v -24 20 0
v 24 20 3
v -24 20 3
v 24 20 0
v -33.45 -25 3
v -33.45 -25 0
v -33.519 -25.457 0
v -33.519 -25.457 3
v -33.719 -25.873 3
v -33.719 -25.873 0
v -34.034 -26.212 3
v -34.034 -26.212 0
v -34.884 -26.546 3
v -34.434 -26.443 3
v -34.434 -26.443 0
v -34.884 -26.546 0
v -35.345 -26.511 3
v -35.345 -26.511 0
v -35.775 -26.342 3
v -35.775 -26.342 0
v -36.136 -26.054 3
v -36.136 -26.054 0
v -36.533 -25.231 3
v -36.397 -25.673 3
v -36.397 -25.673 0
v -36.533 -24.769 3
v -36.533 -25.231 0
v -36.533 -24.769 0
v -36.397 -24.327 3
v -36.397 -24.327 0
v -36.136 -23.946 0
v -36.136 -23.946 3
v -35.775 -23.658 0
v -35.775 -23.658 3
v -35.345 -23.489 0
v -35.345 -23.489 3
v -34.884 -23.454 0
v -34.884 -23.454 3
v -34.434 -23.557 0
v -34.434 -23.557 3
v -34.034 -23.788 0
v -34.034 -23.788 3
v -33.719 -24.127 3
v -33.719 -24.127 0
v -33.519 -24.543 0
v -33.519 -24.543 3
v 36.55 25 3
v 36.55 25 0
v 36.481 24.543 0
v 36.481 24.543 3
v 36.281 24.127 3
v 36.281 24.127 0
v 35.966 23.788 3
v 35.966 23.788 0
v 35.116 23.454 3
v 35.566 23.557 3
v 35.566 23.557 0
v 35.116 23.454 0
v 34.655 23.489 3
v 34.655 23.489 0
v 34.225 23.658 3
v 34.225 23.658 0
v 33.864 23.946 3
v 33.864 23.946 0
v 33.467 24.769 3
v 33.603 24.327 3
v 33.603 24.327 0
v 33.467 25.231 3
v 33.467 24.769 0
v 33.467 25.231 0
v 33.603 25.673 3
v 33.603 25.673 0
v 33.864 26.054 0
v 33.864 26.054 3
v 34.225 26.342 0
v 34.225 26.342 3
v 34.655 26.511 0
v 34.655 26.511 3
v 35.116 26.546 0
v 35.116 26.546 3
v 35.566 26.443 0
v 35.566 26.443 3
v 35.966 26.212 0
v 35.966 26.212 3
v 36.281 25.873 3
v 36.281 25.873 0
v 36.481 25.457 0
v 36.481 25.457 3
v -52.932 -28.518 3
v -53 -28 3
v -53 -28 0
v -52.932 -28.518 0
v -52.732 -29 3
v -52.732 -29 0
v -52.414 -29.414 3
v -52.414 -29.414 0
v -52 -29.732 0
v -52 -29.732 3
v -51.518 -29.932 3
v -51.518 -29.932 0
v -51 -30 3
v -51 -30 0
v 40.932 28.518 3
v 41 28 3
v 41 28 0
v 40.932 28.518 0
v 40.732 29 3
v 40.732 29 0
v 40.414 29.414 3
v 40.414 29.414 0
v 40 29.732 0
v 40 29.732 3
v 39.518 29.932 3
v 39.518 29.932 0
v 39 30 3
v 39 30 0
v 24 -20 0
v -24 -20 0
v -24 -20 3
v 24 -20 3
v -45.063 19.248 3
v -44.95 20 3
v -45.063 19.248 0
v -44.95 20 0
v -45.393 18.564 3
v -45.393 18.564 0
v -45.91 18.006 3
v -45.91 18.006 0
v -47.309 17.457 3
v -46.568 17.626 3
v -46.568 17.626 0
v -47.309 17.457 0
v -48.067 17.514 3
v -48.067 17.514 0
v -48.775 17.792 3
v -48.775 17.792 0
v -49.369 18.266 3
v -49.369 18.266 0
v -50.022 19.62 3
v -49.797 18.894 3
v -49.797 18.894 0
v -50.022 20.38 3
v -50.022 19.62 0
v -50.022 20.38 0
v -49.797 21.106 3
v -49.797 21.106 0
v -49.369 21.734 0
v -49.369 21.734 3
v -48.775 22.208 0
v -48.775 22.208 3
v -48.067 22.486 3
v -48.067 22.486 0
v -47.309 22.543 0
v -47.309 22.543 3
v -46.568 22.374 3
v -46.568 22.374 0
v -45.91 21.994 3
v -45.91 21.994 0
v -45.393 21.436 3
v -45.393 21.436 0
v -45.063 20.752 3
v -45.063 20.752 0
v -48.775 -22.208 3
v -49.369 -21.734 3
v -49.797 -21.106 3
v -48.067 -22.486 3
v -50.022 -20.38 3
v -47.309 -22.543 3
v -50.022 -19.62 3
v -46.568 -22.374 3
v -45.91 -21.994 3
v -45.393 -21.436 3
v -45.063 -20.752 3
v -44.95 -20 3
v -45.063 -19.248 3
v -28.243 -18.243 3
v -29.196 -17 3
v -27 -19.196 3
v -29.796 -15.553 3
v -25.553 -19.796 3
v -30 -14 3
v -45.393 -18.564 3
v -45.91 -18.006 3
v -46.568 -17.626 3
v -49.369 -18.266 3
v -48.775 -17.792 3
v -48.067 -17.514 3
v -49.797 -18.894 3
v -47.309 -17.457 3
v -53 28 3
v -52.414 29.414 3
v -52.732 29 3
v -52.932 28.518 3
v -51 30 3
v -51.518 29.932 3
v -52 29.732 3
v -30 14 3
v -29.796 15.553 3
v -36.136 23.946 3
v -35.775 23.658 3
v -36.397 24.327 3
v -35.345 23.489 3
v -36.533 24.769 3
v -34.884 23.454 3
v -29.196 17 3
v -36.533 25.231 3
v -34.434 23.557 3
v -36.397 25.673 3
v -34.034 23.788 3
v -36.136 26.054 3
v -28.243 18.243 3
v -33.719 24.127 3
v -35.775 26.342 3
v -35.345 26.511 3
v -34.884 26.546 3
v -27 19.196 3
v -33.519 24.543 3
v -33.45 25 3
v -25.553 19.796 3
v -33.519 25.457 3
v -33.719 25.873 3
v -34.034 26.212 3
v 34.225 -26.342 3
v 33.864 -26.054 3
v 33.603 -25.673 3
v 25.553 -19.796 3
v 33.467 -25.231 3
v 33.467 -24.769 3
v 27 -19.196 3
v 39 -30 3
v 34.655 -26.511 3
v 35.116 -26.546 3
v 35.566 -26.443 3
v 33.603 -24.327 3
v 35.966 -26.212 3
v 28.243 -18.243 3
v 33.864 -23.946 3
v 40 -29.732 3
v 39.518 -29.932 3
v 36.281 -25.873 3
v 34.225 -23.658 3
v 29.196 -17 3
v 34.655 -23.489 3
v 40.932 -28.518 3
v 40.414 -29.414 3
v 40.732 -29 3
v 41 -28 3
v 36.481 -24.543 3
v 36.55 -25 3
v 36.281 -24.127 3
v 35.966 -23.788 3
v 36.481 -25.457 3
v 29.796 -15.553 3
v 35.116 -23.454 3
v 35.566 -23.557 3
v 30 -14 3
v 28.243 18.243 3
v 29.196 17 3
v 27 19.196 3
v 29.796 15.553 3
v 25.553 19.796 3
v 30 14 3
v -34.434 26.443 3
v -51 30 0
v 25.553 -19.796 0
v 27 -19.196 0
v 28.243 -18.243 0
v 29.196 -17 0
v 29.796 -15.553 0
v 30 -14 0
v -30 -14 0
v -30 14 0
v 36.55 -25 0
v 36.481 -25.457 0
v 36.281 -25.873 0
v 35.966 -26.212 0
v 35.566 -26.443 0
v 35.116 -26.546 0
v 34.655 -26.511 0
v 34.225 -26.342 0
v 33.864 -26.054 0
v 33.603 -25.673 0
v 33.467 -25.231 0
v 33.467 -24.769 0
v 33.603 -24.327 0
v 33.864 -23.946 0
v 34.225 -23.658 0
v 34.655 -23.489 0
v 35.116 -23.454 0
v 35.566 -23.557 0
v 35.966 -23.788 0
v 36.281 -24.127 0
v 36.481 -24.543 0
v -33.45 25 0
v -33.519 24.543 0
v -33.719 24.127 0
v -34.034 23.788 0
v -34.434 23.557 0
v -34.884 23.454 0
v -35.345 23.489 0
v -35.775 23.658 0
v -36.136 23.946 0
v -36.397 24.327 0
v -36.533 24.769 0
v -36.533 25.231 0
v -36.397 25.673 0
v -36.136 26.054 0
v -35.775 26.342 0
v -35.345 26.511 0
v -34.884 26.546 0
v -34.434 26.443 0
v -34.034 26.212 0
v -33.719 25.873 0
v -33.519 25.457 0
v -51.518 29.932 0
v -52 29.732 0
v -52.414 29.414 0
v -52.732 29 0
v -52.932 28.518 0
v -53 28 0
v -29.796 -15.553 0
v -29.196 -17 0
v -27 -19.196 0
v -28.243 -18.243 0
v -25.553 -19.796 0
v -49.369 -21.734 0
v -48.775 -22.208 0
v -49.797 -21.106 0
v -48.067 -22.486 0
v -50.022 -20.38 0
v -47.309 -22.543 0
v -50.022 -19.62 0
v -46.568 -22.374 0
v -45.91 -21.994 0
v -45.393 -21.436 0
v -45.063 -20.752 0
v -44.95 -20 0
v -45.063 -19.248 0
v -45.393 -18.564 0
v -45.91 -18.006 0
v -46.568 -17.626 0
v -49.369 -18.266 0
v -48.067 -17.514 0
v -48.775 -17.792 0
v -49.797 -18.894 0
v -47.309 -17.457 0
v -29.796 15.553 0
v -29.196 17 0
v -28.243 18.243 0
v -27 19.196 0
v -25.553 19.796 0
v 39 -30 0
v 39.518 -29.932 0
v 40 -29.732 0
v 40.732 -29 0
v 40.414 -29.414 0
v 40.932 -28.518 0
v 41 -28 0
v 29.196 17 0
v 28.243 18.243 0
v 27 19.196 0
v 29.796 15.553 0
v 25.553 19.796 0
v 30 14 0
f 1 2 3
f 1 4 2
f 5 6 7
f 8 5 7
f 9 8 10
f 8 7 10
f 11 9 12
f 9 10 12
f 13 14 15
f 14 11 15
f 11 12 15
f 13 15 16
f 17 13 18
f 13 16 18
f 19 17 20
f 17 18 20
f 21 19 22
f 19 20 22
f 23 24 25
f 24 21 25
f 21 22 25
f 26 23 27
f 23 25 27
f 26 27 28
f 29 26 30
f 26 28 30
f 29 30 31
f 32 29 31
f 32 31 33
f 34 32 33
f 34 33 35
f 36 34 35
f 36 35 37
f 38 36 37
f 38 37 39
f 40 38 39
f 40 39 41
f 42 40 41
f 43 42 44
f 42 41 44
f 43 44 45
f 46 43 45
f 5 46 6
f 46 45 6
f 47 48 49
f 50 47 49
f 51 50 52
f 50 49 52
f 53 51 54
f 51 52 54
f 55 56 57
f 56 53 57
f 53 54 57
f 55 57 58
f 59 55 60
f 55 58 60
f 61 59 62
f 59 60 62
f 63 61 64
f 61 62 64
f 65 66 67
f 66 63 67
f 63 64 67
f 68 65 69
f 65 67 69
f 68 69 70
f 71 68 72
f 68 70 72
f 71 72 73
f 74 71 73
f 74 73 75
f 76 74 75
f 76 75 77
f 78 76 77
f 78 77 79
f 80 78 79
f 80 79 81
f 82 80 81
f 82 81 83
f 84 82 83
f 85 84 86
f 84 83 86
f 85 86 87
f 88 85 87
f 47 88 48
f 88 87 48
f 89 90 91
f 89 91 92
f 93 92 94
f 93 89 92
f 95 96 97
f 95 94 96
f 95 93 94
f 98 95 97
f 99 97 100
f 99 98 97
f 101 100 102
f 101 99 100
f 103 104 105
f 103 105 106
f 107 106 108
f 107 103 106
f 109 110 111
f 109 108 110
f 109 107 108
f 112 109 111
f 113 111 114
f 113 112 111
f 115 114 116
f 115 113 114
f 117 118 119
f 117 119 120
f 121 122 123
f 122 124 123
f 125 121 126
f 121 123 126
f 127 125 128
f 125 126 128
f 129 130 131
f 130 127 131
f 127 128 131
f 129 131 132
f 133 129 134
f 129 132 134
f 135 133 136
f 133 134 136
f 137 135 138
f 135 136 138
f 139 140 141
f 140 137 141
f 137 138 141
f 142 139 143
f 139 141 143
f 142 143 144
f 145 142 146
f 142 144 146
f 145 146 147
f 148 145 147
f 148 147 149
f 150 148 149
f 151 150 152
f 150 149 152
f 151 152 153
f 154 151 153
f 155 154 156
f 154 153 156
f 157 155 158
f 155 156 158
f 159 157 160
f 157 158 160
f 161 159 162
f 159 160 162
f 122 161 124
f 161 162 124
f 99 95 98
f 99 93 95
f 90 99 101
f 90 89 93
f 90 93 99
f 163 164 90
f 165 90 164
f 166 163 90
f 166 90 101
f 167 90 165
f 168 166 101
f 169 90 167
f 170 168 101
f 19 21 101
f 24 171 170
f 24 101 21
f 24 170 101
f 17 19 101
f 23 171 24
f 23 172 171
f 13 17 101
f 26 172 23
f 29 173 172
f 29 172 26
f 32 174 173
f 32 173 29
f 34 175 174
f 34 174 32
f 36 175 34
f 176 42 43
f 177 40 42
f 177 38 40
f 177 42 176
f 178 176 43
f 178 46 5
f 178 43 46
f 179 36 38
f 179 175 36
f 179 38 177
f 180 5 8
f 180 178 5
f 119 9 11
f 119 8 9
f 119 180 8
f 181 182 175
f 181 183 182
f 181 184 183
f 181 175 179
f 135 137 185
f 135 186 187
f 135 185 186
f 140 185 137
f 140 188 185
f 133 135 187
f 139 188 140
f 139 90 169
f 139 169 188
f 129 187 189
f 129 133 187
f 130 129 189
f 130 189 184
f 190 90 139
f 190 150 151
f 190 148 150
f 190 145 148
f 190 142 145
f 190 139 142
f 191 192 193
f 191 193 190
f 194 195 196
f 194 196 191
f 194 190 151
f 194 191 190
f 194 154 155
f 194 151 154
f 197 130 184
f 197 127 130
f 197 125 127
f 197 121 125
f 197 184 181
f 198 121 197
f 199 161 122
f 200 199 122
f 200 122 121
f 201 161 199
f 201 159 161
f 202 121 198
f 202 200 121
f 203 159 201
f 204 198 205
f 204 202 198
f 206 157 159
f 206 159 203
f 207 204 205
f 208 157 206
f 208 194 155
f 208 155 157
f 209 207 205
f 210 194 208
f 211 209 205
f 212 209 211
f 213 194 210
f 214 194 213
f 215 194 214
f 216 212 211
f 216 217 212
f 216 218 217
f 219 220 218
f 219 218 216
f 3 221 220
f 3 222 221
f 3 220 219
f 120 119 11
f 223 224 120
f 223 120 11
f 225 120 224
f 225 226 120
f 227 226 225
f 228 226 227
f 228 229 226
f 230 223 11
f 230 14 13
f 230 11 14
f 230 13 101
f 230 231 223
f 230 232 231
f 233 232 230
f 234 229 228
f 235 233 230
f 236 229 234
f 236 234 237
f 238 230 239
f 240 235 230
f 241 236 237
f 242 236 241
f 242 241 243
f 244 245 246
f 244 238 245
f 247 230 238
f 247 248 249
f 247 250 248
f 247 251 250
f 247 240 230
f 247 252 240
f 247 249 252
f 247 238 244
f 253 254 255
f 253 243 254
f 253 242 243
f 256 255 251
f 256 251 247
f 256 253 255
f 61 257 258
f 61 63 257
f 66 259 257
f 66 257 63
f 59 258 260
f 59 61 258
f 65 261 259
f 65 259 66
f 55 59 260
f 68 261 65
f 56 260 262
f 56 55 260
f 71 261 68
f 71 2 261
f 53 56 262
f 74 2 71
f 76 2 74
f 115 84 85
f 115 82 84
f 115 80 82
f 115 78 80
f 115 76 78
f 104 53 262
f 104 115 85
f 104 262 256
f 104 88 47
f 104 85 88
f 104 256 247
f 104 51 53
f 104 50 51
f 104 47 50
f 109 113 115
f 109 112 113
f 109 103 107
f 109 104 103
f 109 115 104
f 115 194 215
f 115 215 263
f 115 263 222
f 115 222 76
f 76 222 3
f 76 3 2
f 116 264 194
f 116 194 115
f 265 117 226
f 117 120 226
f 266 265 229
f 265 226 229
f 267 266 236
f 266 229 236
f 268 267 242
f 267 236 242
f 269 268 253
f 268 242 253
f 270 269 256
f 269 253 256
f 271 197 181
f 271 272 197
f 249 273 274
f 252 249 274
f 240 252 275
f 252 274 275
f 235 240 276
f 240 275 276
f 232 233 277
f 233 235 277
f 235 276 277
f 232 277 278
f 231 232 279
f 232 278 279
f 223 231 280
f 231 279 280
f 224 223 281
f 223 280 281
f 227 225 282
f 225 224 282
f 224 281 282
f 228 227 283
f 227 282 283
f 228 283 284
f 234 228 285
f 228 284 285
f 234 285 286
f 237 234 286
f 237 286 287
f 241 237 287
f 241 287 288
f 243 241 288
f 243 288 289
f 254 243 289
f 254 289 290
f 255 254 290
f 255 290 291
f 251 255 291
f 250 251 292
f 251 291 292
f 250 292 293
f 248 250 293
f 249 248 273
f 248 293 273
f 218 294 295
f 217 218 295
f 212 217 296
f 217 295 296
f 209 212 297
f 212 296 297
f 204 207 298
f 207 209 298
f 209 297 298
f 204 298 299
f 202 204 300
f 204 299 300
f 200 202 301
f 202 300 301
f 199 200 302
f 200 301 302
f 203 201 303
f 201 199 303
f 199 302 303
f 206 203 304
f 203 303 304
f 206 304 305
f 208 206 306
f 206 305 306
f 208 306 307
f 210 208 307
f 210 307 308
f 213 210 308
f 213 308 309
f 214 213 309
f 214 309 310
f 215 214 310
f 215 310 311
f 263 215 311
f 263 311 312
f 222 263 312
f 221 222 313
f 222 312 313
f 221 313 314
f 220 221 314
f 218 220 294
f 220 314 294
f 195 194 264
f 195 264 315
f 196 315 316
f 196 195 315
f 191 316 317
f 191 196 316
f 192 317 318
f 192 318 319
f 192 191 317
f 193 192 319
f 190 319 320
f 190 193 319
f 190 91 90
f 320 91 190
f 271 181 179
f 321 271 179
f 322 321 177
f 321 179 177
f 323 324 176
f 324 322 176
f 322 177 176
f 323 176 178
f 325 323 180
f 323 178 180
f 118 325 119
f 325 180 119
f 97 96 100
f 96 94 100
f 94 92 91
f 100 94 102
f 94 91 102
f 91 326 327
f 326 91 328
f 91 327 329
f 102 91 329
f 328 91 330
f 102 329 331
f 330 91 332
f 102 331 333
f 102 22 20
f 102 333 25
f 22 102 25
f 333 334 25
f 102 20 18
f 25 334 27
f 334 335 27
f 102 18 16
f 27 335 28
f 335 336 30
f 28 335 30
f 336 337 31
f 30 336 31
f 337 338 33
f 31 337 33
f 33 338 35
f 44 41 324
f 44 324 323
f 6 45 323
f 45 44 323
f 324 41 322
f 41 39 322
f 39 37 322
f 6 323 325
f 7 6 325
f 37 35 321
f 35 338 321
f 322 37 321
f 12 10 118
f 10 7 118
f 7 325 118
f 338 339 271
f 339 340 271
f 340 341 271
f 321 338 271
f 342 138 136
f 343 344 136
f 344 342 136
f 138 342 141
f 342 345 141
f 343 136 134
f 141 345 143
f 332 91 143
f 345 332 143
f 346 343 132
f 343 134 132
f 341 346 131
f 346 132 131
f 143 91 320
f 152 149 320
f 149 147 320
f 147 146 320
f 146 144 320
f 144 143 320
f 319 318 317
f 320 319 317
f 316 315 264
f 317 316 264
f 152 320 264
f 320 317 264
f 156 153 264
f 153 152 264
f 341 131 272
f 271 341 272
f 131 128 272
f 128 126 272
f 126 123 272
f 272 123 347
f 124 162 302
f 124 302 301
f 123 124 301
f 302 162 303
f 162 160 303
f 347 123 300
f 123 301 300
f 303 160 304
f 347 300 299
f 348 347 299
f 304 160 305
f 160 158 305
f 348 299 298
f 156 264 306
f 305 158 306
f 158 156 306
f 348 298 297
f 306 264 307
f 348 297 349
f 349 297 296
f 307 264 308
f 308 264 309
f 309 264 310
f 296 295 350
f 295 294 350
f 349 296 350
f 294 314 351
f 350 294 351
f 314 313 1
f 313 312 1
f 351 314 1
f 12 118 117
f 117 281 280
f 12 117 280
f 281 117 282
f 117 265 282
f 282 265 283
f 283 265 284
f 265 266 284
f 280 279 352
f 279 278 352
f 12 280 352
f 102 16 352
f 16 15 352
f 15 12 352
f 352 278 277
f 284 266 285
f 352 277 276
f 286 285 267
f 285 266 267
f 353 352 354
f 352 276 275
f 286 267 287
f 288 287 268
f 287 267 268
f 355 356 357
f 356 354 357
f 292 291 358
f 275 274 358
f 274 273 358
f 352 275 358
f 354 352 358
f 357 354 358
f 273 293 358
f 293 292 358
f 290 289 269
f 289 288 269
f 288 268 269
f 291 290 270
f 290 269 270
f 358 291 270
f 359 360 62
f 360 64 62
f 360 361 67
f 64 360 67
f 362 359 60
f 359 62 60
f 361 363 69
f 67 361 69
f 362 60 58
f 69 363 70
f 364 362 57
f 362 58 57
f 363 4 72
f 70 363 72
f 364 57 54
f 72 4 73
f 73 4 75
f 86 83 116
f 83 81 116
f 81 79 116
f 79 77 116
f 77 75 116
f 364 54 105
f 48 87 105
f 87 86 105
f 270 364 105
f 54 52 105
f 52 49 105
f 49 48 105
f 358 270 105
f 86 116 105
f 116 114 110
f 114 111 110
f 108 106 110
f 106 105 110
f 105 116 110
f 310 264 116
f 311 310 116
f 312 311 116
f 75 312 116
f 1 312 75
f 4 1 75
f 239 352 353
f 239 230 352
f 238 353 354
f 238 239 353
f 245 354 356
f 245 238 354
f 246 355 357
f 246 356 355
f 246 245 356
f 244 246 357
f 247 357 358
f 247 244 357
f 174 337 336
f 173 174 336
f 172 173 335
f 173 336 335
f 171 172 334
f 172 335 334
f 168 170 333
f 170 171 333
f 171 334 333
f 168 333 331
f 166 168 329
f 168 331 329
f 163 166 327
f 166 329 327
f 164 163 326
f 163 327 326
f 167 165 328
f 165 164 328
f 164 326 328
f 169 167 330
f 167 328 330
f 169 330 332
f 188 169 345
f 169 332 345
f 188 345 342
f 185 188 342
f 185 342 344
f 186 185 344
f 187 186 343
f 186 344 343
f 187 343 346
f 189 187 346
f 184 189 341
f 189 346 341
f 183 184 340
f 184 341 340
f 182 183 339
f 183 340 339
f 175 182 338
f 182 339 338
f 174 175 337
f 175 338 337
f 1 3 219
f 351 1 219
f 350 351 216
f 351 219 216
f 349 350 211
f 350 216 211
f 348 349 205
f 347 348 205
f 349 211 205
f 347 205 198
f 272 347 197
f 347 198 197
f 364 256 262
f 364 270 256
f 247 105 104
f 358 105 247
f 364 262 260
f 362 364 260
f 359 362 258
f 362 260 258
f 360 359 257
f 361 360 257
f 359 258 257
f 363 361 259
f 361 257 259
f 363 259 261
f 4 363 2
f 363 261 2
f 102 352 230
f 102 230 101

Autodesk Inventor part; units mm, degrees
ref_plane "YZ Plane" through (0, 0, 0) normal (1, 0, 0) x (0, 1, 0)
ref_plane "XZ Plane" through (0, 0, 0) normal (0, 1, 0) x (-1, 0, 0)
ref_plane "XY Plane" through (0, 0, 0) normal (0, 0, 1) x (1, 0, 0)
sketch "Sketch1" plane through (0, 0, 0) normal (0, 0, 1) x (1, 0, 0)
  line L0 (0, 42) -> (0, -42) construction
  line L1 (-71.8, 0) -> (59.8, 0) construction
  line L2 (-39, -29) -> (39, -29) construction
  line L3 (39, -29) -> (39, 29) construction
  line L4 (39, 29) -> (-39, 29) construction
  line L5 (-39, 29) -> (-39, -29) construction
  line L6 (-39, -29) -> (39, 29) construction
  line L7 (39, -29) -> (-39, 29) construction
  line L8 (-35, -25) -> (35, -25) construction
  line L9 (35, -25) -> (35, 25) construction
  line L10 (35, 25) -> (-35, 25) construction
  line L11 (-35, 25) -> (-35, -25) construction
  line L12 (-35, -25) -> (35, 25) construction
  line L13 (35, -25) -> (-35, 25) construction
  circle A0 centre (-35, 25) radius 1.55
  circle A1 centre (-35, -25) radius 1.55
  circle A2 centre (35, -25) radius 1.55
  circle A3 centre (35, 25) radius 1.55
  line L14 (-53, 30) -> (41, 30)
  line L15 (41, 30) -> (41, -30)
  line L16 (41, -30) -> (-53, -30)
  line L17 (-53, -30) -> (-53, 30)
  line L18 (-30, -20) -> (30, -20)
  line L19 (30, -20) -> (30, 20)
  line L20 (30, 20) -> (-30, 20)
  line L21 (-30, 20) -> (-30, -20)
  line L22 (-30, -20) -> (30, 20) construction
  line L23 (30, -20) -> (-30, 20) construction
  circle A4 centre (-47.5, 20) radius 2.55
  circle A5 centre (-47.5, -20) radius 2.55
  point P0 (0, 0)
  point P1 (-53, 0)
  point P2 (-39, 0)
  dimension "d4" = 58
  dimension "d5" = 78
  dimension "d6" = 4
  dimension "d7" = 50
  dimension "d8" = 3.1
  dimension "d9" = 14
  dimension "d10" = 60
  dimension "d12" = 40
  dimension "d13" = 60
  dimension "d16" = 2
  dimension "d17" = 5.1
  dimension "d18" = 20
  dimension "d19" = 5.5
  dimension "d20" = 20
extrude "Extrusion3" add sketch "Sketch1" along normal blind 3
fillet "Fillet1" radius 6 4 edges at (-30, 20, 1.5) (-30, -20, 1.5) (30, -20, 1.5) (30, 20, 1.5)
fillet "Fillet2" radius 2 4 edges at (41, 30, 1.5) (-53, 30, 1.5) (-53, -30, 1.5) (41, -30, 1.5)
properties part number "PCB plate" material "ALMg4,5Mn-5083-(D54S)"
